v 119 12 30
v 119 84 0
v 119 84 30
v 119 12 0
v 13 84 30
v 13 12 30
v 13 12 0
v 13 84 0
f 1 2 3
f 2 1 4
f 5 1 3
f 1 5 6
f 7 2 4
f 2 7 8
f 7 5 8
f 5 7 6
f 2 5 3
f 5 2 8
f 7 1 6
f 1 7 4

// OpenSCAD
// Bench rack for 1.5 mL microcentrifuge tubes
// Dimensions measured with calipers, units in millimetres

// Overall block dimensions
block_length = 106;  // X dimension
block_width = 72;     // Y dimension
block_height = 30;    // Z dimension

// Hole grid dimensions
rows_count = 4;       // Number of rows along Y
cols_count = 6;       // Number of columns along X
hole_pitch_x = 16;  // Centre-to-centre spacing in X
hole_pitch_y = 16;  // Centre-to-centre spacing in Y

// Hole dimensions
hole_diameter = 11.2;
hole_depth = 25;
floor_thickness = 5;

// Calculate grid centering offsets
// Total grid width = (cols_count - 1) * pitch_x
// Total grid height = (rows_count - 1) * pitch_y
// Center the grid on the block
grid_width = (cols_count - 1) * hole_pitch_x;
grid_height = (rows_count - 1) * hole_pitch_y;

offset_x = (block_length - grid_width) / 2;
offset_y = (block_width - grid_height) / 2;

// Hole radius
hole_radius = hole_diameter / 2;

// Base block
module base_block() {
    translate([offset_x, offset_y, 0])
        cube([block_length, block_width, block_height], center = false);
}

// Single hole module
module single_hole(x_pos, y_pos) {
    // Cut cylinder extending slightly past the bottom to ensure clean cut
    translate([x_pos, y_pos, 0])
        cylinder(h = hole_depth + 0.01, r = hole_radius, $fn = 64);
}

// Main assembly
union() {
    base_block();
    
    // Generate hole grid
    for (i = [0 : cols_count - 1]) {
        for (j = [0 : rows_count - 1]) {
            x_pos = offset_x + i * hole_pitch_x;
            y_pos = offset_y + j * hole_pitch_y;
            difference() {
                // The base block is already in the union, so we subtract holes from it
                // We use a separate difference block for each hole to ensure clean cuts
                base_block();
                single_hole(x_pos, y_pos);
            }
        }
    }
}
